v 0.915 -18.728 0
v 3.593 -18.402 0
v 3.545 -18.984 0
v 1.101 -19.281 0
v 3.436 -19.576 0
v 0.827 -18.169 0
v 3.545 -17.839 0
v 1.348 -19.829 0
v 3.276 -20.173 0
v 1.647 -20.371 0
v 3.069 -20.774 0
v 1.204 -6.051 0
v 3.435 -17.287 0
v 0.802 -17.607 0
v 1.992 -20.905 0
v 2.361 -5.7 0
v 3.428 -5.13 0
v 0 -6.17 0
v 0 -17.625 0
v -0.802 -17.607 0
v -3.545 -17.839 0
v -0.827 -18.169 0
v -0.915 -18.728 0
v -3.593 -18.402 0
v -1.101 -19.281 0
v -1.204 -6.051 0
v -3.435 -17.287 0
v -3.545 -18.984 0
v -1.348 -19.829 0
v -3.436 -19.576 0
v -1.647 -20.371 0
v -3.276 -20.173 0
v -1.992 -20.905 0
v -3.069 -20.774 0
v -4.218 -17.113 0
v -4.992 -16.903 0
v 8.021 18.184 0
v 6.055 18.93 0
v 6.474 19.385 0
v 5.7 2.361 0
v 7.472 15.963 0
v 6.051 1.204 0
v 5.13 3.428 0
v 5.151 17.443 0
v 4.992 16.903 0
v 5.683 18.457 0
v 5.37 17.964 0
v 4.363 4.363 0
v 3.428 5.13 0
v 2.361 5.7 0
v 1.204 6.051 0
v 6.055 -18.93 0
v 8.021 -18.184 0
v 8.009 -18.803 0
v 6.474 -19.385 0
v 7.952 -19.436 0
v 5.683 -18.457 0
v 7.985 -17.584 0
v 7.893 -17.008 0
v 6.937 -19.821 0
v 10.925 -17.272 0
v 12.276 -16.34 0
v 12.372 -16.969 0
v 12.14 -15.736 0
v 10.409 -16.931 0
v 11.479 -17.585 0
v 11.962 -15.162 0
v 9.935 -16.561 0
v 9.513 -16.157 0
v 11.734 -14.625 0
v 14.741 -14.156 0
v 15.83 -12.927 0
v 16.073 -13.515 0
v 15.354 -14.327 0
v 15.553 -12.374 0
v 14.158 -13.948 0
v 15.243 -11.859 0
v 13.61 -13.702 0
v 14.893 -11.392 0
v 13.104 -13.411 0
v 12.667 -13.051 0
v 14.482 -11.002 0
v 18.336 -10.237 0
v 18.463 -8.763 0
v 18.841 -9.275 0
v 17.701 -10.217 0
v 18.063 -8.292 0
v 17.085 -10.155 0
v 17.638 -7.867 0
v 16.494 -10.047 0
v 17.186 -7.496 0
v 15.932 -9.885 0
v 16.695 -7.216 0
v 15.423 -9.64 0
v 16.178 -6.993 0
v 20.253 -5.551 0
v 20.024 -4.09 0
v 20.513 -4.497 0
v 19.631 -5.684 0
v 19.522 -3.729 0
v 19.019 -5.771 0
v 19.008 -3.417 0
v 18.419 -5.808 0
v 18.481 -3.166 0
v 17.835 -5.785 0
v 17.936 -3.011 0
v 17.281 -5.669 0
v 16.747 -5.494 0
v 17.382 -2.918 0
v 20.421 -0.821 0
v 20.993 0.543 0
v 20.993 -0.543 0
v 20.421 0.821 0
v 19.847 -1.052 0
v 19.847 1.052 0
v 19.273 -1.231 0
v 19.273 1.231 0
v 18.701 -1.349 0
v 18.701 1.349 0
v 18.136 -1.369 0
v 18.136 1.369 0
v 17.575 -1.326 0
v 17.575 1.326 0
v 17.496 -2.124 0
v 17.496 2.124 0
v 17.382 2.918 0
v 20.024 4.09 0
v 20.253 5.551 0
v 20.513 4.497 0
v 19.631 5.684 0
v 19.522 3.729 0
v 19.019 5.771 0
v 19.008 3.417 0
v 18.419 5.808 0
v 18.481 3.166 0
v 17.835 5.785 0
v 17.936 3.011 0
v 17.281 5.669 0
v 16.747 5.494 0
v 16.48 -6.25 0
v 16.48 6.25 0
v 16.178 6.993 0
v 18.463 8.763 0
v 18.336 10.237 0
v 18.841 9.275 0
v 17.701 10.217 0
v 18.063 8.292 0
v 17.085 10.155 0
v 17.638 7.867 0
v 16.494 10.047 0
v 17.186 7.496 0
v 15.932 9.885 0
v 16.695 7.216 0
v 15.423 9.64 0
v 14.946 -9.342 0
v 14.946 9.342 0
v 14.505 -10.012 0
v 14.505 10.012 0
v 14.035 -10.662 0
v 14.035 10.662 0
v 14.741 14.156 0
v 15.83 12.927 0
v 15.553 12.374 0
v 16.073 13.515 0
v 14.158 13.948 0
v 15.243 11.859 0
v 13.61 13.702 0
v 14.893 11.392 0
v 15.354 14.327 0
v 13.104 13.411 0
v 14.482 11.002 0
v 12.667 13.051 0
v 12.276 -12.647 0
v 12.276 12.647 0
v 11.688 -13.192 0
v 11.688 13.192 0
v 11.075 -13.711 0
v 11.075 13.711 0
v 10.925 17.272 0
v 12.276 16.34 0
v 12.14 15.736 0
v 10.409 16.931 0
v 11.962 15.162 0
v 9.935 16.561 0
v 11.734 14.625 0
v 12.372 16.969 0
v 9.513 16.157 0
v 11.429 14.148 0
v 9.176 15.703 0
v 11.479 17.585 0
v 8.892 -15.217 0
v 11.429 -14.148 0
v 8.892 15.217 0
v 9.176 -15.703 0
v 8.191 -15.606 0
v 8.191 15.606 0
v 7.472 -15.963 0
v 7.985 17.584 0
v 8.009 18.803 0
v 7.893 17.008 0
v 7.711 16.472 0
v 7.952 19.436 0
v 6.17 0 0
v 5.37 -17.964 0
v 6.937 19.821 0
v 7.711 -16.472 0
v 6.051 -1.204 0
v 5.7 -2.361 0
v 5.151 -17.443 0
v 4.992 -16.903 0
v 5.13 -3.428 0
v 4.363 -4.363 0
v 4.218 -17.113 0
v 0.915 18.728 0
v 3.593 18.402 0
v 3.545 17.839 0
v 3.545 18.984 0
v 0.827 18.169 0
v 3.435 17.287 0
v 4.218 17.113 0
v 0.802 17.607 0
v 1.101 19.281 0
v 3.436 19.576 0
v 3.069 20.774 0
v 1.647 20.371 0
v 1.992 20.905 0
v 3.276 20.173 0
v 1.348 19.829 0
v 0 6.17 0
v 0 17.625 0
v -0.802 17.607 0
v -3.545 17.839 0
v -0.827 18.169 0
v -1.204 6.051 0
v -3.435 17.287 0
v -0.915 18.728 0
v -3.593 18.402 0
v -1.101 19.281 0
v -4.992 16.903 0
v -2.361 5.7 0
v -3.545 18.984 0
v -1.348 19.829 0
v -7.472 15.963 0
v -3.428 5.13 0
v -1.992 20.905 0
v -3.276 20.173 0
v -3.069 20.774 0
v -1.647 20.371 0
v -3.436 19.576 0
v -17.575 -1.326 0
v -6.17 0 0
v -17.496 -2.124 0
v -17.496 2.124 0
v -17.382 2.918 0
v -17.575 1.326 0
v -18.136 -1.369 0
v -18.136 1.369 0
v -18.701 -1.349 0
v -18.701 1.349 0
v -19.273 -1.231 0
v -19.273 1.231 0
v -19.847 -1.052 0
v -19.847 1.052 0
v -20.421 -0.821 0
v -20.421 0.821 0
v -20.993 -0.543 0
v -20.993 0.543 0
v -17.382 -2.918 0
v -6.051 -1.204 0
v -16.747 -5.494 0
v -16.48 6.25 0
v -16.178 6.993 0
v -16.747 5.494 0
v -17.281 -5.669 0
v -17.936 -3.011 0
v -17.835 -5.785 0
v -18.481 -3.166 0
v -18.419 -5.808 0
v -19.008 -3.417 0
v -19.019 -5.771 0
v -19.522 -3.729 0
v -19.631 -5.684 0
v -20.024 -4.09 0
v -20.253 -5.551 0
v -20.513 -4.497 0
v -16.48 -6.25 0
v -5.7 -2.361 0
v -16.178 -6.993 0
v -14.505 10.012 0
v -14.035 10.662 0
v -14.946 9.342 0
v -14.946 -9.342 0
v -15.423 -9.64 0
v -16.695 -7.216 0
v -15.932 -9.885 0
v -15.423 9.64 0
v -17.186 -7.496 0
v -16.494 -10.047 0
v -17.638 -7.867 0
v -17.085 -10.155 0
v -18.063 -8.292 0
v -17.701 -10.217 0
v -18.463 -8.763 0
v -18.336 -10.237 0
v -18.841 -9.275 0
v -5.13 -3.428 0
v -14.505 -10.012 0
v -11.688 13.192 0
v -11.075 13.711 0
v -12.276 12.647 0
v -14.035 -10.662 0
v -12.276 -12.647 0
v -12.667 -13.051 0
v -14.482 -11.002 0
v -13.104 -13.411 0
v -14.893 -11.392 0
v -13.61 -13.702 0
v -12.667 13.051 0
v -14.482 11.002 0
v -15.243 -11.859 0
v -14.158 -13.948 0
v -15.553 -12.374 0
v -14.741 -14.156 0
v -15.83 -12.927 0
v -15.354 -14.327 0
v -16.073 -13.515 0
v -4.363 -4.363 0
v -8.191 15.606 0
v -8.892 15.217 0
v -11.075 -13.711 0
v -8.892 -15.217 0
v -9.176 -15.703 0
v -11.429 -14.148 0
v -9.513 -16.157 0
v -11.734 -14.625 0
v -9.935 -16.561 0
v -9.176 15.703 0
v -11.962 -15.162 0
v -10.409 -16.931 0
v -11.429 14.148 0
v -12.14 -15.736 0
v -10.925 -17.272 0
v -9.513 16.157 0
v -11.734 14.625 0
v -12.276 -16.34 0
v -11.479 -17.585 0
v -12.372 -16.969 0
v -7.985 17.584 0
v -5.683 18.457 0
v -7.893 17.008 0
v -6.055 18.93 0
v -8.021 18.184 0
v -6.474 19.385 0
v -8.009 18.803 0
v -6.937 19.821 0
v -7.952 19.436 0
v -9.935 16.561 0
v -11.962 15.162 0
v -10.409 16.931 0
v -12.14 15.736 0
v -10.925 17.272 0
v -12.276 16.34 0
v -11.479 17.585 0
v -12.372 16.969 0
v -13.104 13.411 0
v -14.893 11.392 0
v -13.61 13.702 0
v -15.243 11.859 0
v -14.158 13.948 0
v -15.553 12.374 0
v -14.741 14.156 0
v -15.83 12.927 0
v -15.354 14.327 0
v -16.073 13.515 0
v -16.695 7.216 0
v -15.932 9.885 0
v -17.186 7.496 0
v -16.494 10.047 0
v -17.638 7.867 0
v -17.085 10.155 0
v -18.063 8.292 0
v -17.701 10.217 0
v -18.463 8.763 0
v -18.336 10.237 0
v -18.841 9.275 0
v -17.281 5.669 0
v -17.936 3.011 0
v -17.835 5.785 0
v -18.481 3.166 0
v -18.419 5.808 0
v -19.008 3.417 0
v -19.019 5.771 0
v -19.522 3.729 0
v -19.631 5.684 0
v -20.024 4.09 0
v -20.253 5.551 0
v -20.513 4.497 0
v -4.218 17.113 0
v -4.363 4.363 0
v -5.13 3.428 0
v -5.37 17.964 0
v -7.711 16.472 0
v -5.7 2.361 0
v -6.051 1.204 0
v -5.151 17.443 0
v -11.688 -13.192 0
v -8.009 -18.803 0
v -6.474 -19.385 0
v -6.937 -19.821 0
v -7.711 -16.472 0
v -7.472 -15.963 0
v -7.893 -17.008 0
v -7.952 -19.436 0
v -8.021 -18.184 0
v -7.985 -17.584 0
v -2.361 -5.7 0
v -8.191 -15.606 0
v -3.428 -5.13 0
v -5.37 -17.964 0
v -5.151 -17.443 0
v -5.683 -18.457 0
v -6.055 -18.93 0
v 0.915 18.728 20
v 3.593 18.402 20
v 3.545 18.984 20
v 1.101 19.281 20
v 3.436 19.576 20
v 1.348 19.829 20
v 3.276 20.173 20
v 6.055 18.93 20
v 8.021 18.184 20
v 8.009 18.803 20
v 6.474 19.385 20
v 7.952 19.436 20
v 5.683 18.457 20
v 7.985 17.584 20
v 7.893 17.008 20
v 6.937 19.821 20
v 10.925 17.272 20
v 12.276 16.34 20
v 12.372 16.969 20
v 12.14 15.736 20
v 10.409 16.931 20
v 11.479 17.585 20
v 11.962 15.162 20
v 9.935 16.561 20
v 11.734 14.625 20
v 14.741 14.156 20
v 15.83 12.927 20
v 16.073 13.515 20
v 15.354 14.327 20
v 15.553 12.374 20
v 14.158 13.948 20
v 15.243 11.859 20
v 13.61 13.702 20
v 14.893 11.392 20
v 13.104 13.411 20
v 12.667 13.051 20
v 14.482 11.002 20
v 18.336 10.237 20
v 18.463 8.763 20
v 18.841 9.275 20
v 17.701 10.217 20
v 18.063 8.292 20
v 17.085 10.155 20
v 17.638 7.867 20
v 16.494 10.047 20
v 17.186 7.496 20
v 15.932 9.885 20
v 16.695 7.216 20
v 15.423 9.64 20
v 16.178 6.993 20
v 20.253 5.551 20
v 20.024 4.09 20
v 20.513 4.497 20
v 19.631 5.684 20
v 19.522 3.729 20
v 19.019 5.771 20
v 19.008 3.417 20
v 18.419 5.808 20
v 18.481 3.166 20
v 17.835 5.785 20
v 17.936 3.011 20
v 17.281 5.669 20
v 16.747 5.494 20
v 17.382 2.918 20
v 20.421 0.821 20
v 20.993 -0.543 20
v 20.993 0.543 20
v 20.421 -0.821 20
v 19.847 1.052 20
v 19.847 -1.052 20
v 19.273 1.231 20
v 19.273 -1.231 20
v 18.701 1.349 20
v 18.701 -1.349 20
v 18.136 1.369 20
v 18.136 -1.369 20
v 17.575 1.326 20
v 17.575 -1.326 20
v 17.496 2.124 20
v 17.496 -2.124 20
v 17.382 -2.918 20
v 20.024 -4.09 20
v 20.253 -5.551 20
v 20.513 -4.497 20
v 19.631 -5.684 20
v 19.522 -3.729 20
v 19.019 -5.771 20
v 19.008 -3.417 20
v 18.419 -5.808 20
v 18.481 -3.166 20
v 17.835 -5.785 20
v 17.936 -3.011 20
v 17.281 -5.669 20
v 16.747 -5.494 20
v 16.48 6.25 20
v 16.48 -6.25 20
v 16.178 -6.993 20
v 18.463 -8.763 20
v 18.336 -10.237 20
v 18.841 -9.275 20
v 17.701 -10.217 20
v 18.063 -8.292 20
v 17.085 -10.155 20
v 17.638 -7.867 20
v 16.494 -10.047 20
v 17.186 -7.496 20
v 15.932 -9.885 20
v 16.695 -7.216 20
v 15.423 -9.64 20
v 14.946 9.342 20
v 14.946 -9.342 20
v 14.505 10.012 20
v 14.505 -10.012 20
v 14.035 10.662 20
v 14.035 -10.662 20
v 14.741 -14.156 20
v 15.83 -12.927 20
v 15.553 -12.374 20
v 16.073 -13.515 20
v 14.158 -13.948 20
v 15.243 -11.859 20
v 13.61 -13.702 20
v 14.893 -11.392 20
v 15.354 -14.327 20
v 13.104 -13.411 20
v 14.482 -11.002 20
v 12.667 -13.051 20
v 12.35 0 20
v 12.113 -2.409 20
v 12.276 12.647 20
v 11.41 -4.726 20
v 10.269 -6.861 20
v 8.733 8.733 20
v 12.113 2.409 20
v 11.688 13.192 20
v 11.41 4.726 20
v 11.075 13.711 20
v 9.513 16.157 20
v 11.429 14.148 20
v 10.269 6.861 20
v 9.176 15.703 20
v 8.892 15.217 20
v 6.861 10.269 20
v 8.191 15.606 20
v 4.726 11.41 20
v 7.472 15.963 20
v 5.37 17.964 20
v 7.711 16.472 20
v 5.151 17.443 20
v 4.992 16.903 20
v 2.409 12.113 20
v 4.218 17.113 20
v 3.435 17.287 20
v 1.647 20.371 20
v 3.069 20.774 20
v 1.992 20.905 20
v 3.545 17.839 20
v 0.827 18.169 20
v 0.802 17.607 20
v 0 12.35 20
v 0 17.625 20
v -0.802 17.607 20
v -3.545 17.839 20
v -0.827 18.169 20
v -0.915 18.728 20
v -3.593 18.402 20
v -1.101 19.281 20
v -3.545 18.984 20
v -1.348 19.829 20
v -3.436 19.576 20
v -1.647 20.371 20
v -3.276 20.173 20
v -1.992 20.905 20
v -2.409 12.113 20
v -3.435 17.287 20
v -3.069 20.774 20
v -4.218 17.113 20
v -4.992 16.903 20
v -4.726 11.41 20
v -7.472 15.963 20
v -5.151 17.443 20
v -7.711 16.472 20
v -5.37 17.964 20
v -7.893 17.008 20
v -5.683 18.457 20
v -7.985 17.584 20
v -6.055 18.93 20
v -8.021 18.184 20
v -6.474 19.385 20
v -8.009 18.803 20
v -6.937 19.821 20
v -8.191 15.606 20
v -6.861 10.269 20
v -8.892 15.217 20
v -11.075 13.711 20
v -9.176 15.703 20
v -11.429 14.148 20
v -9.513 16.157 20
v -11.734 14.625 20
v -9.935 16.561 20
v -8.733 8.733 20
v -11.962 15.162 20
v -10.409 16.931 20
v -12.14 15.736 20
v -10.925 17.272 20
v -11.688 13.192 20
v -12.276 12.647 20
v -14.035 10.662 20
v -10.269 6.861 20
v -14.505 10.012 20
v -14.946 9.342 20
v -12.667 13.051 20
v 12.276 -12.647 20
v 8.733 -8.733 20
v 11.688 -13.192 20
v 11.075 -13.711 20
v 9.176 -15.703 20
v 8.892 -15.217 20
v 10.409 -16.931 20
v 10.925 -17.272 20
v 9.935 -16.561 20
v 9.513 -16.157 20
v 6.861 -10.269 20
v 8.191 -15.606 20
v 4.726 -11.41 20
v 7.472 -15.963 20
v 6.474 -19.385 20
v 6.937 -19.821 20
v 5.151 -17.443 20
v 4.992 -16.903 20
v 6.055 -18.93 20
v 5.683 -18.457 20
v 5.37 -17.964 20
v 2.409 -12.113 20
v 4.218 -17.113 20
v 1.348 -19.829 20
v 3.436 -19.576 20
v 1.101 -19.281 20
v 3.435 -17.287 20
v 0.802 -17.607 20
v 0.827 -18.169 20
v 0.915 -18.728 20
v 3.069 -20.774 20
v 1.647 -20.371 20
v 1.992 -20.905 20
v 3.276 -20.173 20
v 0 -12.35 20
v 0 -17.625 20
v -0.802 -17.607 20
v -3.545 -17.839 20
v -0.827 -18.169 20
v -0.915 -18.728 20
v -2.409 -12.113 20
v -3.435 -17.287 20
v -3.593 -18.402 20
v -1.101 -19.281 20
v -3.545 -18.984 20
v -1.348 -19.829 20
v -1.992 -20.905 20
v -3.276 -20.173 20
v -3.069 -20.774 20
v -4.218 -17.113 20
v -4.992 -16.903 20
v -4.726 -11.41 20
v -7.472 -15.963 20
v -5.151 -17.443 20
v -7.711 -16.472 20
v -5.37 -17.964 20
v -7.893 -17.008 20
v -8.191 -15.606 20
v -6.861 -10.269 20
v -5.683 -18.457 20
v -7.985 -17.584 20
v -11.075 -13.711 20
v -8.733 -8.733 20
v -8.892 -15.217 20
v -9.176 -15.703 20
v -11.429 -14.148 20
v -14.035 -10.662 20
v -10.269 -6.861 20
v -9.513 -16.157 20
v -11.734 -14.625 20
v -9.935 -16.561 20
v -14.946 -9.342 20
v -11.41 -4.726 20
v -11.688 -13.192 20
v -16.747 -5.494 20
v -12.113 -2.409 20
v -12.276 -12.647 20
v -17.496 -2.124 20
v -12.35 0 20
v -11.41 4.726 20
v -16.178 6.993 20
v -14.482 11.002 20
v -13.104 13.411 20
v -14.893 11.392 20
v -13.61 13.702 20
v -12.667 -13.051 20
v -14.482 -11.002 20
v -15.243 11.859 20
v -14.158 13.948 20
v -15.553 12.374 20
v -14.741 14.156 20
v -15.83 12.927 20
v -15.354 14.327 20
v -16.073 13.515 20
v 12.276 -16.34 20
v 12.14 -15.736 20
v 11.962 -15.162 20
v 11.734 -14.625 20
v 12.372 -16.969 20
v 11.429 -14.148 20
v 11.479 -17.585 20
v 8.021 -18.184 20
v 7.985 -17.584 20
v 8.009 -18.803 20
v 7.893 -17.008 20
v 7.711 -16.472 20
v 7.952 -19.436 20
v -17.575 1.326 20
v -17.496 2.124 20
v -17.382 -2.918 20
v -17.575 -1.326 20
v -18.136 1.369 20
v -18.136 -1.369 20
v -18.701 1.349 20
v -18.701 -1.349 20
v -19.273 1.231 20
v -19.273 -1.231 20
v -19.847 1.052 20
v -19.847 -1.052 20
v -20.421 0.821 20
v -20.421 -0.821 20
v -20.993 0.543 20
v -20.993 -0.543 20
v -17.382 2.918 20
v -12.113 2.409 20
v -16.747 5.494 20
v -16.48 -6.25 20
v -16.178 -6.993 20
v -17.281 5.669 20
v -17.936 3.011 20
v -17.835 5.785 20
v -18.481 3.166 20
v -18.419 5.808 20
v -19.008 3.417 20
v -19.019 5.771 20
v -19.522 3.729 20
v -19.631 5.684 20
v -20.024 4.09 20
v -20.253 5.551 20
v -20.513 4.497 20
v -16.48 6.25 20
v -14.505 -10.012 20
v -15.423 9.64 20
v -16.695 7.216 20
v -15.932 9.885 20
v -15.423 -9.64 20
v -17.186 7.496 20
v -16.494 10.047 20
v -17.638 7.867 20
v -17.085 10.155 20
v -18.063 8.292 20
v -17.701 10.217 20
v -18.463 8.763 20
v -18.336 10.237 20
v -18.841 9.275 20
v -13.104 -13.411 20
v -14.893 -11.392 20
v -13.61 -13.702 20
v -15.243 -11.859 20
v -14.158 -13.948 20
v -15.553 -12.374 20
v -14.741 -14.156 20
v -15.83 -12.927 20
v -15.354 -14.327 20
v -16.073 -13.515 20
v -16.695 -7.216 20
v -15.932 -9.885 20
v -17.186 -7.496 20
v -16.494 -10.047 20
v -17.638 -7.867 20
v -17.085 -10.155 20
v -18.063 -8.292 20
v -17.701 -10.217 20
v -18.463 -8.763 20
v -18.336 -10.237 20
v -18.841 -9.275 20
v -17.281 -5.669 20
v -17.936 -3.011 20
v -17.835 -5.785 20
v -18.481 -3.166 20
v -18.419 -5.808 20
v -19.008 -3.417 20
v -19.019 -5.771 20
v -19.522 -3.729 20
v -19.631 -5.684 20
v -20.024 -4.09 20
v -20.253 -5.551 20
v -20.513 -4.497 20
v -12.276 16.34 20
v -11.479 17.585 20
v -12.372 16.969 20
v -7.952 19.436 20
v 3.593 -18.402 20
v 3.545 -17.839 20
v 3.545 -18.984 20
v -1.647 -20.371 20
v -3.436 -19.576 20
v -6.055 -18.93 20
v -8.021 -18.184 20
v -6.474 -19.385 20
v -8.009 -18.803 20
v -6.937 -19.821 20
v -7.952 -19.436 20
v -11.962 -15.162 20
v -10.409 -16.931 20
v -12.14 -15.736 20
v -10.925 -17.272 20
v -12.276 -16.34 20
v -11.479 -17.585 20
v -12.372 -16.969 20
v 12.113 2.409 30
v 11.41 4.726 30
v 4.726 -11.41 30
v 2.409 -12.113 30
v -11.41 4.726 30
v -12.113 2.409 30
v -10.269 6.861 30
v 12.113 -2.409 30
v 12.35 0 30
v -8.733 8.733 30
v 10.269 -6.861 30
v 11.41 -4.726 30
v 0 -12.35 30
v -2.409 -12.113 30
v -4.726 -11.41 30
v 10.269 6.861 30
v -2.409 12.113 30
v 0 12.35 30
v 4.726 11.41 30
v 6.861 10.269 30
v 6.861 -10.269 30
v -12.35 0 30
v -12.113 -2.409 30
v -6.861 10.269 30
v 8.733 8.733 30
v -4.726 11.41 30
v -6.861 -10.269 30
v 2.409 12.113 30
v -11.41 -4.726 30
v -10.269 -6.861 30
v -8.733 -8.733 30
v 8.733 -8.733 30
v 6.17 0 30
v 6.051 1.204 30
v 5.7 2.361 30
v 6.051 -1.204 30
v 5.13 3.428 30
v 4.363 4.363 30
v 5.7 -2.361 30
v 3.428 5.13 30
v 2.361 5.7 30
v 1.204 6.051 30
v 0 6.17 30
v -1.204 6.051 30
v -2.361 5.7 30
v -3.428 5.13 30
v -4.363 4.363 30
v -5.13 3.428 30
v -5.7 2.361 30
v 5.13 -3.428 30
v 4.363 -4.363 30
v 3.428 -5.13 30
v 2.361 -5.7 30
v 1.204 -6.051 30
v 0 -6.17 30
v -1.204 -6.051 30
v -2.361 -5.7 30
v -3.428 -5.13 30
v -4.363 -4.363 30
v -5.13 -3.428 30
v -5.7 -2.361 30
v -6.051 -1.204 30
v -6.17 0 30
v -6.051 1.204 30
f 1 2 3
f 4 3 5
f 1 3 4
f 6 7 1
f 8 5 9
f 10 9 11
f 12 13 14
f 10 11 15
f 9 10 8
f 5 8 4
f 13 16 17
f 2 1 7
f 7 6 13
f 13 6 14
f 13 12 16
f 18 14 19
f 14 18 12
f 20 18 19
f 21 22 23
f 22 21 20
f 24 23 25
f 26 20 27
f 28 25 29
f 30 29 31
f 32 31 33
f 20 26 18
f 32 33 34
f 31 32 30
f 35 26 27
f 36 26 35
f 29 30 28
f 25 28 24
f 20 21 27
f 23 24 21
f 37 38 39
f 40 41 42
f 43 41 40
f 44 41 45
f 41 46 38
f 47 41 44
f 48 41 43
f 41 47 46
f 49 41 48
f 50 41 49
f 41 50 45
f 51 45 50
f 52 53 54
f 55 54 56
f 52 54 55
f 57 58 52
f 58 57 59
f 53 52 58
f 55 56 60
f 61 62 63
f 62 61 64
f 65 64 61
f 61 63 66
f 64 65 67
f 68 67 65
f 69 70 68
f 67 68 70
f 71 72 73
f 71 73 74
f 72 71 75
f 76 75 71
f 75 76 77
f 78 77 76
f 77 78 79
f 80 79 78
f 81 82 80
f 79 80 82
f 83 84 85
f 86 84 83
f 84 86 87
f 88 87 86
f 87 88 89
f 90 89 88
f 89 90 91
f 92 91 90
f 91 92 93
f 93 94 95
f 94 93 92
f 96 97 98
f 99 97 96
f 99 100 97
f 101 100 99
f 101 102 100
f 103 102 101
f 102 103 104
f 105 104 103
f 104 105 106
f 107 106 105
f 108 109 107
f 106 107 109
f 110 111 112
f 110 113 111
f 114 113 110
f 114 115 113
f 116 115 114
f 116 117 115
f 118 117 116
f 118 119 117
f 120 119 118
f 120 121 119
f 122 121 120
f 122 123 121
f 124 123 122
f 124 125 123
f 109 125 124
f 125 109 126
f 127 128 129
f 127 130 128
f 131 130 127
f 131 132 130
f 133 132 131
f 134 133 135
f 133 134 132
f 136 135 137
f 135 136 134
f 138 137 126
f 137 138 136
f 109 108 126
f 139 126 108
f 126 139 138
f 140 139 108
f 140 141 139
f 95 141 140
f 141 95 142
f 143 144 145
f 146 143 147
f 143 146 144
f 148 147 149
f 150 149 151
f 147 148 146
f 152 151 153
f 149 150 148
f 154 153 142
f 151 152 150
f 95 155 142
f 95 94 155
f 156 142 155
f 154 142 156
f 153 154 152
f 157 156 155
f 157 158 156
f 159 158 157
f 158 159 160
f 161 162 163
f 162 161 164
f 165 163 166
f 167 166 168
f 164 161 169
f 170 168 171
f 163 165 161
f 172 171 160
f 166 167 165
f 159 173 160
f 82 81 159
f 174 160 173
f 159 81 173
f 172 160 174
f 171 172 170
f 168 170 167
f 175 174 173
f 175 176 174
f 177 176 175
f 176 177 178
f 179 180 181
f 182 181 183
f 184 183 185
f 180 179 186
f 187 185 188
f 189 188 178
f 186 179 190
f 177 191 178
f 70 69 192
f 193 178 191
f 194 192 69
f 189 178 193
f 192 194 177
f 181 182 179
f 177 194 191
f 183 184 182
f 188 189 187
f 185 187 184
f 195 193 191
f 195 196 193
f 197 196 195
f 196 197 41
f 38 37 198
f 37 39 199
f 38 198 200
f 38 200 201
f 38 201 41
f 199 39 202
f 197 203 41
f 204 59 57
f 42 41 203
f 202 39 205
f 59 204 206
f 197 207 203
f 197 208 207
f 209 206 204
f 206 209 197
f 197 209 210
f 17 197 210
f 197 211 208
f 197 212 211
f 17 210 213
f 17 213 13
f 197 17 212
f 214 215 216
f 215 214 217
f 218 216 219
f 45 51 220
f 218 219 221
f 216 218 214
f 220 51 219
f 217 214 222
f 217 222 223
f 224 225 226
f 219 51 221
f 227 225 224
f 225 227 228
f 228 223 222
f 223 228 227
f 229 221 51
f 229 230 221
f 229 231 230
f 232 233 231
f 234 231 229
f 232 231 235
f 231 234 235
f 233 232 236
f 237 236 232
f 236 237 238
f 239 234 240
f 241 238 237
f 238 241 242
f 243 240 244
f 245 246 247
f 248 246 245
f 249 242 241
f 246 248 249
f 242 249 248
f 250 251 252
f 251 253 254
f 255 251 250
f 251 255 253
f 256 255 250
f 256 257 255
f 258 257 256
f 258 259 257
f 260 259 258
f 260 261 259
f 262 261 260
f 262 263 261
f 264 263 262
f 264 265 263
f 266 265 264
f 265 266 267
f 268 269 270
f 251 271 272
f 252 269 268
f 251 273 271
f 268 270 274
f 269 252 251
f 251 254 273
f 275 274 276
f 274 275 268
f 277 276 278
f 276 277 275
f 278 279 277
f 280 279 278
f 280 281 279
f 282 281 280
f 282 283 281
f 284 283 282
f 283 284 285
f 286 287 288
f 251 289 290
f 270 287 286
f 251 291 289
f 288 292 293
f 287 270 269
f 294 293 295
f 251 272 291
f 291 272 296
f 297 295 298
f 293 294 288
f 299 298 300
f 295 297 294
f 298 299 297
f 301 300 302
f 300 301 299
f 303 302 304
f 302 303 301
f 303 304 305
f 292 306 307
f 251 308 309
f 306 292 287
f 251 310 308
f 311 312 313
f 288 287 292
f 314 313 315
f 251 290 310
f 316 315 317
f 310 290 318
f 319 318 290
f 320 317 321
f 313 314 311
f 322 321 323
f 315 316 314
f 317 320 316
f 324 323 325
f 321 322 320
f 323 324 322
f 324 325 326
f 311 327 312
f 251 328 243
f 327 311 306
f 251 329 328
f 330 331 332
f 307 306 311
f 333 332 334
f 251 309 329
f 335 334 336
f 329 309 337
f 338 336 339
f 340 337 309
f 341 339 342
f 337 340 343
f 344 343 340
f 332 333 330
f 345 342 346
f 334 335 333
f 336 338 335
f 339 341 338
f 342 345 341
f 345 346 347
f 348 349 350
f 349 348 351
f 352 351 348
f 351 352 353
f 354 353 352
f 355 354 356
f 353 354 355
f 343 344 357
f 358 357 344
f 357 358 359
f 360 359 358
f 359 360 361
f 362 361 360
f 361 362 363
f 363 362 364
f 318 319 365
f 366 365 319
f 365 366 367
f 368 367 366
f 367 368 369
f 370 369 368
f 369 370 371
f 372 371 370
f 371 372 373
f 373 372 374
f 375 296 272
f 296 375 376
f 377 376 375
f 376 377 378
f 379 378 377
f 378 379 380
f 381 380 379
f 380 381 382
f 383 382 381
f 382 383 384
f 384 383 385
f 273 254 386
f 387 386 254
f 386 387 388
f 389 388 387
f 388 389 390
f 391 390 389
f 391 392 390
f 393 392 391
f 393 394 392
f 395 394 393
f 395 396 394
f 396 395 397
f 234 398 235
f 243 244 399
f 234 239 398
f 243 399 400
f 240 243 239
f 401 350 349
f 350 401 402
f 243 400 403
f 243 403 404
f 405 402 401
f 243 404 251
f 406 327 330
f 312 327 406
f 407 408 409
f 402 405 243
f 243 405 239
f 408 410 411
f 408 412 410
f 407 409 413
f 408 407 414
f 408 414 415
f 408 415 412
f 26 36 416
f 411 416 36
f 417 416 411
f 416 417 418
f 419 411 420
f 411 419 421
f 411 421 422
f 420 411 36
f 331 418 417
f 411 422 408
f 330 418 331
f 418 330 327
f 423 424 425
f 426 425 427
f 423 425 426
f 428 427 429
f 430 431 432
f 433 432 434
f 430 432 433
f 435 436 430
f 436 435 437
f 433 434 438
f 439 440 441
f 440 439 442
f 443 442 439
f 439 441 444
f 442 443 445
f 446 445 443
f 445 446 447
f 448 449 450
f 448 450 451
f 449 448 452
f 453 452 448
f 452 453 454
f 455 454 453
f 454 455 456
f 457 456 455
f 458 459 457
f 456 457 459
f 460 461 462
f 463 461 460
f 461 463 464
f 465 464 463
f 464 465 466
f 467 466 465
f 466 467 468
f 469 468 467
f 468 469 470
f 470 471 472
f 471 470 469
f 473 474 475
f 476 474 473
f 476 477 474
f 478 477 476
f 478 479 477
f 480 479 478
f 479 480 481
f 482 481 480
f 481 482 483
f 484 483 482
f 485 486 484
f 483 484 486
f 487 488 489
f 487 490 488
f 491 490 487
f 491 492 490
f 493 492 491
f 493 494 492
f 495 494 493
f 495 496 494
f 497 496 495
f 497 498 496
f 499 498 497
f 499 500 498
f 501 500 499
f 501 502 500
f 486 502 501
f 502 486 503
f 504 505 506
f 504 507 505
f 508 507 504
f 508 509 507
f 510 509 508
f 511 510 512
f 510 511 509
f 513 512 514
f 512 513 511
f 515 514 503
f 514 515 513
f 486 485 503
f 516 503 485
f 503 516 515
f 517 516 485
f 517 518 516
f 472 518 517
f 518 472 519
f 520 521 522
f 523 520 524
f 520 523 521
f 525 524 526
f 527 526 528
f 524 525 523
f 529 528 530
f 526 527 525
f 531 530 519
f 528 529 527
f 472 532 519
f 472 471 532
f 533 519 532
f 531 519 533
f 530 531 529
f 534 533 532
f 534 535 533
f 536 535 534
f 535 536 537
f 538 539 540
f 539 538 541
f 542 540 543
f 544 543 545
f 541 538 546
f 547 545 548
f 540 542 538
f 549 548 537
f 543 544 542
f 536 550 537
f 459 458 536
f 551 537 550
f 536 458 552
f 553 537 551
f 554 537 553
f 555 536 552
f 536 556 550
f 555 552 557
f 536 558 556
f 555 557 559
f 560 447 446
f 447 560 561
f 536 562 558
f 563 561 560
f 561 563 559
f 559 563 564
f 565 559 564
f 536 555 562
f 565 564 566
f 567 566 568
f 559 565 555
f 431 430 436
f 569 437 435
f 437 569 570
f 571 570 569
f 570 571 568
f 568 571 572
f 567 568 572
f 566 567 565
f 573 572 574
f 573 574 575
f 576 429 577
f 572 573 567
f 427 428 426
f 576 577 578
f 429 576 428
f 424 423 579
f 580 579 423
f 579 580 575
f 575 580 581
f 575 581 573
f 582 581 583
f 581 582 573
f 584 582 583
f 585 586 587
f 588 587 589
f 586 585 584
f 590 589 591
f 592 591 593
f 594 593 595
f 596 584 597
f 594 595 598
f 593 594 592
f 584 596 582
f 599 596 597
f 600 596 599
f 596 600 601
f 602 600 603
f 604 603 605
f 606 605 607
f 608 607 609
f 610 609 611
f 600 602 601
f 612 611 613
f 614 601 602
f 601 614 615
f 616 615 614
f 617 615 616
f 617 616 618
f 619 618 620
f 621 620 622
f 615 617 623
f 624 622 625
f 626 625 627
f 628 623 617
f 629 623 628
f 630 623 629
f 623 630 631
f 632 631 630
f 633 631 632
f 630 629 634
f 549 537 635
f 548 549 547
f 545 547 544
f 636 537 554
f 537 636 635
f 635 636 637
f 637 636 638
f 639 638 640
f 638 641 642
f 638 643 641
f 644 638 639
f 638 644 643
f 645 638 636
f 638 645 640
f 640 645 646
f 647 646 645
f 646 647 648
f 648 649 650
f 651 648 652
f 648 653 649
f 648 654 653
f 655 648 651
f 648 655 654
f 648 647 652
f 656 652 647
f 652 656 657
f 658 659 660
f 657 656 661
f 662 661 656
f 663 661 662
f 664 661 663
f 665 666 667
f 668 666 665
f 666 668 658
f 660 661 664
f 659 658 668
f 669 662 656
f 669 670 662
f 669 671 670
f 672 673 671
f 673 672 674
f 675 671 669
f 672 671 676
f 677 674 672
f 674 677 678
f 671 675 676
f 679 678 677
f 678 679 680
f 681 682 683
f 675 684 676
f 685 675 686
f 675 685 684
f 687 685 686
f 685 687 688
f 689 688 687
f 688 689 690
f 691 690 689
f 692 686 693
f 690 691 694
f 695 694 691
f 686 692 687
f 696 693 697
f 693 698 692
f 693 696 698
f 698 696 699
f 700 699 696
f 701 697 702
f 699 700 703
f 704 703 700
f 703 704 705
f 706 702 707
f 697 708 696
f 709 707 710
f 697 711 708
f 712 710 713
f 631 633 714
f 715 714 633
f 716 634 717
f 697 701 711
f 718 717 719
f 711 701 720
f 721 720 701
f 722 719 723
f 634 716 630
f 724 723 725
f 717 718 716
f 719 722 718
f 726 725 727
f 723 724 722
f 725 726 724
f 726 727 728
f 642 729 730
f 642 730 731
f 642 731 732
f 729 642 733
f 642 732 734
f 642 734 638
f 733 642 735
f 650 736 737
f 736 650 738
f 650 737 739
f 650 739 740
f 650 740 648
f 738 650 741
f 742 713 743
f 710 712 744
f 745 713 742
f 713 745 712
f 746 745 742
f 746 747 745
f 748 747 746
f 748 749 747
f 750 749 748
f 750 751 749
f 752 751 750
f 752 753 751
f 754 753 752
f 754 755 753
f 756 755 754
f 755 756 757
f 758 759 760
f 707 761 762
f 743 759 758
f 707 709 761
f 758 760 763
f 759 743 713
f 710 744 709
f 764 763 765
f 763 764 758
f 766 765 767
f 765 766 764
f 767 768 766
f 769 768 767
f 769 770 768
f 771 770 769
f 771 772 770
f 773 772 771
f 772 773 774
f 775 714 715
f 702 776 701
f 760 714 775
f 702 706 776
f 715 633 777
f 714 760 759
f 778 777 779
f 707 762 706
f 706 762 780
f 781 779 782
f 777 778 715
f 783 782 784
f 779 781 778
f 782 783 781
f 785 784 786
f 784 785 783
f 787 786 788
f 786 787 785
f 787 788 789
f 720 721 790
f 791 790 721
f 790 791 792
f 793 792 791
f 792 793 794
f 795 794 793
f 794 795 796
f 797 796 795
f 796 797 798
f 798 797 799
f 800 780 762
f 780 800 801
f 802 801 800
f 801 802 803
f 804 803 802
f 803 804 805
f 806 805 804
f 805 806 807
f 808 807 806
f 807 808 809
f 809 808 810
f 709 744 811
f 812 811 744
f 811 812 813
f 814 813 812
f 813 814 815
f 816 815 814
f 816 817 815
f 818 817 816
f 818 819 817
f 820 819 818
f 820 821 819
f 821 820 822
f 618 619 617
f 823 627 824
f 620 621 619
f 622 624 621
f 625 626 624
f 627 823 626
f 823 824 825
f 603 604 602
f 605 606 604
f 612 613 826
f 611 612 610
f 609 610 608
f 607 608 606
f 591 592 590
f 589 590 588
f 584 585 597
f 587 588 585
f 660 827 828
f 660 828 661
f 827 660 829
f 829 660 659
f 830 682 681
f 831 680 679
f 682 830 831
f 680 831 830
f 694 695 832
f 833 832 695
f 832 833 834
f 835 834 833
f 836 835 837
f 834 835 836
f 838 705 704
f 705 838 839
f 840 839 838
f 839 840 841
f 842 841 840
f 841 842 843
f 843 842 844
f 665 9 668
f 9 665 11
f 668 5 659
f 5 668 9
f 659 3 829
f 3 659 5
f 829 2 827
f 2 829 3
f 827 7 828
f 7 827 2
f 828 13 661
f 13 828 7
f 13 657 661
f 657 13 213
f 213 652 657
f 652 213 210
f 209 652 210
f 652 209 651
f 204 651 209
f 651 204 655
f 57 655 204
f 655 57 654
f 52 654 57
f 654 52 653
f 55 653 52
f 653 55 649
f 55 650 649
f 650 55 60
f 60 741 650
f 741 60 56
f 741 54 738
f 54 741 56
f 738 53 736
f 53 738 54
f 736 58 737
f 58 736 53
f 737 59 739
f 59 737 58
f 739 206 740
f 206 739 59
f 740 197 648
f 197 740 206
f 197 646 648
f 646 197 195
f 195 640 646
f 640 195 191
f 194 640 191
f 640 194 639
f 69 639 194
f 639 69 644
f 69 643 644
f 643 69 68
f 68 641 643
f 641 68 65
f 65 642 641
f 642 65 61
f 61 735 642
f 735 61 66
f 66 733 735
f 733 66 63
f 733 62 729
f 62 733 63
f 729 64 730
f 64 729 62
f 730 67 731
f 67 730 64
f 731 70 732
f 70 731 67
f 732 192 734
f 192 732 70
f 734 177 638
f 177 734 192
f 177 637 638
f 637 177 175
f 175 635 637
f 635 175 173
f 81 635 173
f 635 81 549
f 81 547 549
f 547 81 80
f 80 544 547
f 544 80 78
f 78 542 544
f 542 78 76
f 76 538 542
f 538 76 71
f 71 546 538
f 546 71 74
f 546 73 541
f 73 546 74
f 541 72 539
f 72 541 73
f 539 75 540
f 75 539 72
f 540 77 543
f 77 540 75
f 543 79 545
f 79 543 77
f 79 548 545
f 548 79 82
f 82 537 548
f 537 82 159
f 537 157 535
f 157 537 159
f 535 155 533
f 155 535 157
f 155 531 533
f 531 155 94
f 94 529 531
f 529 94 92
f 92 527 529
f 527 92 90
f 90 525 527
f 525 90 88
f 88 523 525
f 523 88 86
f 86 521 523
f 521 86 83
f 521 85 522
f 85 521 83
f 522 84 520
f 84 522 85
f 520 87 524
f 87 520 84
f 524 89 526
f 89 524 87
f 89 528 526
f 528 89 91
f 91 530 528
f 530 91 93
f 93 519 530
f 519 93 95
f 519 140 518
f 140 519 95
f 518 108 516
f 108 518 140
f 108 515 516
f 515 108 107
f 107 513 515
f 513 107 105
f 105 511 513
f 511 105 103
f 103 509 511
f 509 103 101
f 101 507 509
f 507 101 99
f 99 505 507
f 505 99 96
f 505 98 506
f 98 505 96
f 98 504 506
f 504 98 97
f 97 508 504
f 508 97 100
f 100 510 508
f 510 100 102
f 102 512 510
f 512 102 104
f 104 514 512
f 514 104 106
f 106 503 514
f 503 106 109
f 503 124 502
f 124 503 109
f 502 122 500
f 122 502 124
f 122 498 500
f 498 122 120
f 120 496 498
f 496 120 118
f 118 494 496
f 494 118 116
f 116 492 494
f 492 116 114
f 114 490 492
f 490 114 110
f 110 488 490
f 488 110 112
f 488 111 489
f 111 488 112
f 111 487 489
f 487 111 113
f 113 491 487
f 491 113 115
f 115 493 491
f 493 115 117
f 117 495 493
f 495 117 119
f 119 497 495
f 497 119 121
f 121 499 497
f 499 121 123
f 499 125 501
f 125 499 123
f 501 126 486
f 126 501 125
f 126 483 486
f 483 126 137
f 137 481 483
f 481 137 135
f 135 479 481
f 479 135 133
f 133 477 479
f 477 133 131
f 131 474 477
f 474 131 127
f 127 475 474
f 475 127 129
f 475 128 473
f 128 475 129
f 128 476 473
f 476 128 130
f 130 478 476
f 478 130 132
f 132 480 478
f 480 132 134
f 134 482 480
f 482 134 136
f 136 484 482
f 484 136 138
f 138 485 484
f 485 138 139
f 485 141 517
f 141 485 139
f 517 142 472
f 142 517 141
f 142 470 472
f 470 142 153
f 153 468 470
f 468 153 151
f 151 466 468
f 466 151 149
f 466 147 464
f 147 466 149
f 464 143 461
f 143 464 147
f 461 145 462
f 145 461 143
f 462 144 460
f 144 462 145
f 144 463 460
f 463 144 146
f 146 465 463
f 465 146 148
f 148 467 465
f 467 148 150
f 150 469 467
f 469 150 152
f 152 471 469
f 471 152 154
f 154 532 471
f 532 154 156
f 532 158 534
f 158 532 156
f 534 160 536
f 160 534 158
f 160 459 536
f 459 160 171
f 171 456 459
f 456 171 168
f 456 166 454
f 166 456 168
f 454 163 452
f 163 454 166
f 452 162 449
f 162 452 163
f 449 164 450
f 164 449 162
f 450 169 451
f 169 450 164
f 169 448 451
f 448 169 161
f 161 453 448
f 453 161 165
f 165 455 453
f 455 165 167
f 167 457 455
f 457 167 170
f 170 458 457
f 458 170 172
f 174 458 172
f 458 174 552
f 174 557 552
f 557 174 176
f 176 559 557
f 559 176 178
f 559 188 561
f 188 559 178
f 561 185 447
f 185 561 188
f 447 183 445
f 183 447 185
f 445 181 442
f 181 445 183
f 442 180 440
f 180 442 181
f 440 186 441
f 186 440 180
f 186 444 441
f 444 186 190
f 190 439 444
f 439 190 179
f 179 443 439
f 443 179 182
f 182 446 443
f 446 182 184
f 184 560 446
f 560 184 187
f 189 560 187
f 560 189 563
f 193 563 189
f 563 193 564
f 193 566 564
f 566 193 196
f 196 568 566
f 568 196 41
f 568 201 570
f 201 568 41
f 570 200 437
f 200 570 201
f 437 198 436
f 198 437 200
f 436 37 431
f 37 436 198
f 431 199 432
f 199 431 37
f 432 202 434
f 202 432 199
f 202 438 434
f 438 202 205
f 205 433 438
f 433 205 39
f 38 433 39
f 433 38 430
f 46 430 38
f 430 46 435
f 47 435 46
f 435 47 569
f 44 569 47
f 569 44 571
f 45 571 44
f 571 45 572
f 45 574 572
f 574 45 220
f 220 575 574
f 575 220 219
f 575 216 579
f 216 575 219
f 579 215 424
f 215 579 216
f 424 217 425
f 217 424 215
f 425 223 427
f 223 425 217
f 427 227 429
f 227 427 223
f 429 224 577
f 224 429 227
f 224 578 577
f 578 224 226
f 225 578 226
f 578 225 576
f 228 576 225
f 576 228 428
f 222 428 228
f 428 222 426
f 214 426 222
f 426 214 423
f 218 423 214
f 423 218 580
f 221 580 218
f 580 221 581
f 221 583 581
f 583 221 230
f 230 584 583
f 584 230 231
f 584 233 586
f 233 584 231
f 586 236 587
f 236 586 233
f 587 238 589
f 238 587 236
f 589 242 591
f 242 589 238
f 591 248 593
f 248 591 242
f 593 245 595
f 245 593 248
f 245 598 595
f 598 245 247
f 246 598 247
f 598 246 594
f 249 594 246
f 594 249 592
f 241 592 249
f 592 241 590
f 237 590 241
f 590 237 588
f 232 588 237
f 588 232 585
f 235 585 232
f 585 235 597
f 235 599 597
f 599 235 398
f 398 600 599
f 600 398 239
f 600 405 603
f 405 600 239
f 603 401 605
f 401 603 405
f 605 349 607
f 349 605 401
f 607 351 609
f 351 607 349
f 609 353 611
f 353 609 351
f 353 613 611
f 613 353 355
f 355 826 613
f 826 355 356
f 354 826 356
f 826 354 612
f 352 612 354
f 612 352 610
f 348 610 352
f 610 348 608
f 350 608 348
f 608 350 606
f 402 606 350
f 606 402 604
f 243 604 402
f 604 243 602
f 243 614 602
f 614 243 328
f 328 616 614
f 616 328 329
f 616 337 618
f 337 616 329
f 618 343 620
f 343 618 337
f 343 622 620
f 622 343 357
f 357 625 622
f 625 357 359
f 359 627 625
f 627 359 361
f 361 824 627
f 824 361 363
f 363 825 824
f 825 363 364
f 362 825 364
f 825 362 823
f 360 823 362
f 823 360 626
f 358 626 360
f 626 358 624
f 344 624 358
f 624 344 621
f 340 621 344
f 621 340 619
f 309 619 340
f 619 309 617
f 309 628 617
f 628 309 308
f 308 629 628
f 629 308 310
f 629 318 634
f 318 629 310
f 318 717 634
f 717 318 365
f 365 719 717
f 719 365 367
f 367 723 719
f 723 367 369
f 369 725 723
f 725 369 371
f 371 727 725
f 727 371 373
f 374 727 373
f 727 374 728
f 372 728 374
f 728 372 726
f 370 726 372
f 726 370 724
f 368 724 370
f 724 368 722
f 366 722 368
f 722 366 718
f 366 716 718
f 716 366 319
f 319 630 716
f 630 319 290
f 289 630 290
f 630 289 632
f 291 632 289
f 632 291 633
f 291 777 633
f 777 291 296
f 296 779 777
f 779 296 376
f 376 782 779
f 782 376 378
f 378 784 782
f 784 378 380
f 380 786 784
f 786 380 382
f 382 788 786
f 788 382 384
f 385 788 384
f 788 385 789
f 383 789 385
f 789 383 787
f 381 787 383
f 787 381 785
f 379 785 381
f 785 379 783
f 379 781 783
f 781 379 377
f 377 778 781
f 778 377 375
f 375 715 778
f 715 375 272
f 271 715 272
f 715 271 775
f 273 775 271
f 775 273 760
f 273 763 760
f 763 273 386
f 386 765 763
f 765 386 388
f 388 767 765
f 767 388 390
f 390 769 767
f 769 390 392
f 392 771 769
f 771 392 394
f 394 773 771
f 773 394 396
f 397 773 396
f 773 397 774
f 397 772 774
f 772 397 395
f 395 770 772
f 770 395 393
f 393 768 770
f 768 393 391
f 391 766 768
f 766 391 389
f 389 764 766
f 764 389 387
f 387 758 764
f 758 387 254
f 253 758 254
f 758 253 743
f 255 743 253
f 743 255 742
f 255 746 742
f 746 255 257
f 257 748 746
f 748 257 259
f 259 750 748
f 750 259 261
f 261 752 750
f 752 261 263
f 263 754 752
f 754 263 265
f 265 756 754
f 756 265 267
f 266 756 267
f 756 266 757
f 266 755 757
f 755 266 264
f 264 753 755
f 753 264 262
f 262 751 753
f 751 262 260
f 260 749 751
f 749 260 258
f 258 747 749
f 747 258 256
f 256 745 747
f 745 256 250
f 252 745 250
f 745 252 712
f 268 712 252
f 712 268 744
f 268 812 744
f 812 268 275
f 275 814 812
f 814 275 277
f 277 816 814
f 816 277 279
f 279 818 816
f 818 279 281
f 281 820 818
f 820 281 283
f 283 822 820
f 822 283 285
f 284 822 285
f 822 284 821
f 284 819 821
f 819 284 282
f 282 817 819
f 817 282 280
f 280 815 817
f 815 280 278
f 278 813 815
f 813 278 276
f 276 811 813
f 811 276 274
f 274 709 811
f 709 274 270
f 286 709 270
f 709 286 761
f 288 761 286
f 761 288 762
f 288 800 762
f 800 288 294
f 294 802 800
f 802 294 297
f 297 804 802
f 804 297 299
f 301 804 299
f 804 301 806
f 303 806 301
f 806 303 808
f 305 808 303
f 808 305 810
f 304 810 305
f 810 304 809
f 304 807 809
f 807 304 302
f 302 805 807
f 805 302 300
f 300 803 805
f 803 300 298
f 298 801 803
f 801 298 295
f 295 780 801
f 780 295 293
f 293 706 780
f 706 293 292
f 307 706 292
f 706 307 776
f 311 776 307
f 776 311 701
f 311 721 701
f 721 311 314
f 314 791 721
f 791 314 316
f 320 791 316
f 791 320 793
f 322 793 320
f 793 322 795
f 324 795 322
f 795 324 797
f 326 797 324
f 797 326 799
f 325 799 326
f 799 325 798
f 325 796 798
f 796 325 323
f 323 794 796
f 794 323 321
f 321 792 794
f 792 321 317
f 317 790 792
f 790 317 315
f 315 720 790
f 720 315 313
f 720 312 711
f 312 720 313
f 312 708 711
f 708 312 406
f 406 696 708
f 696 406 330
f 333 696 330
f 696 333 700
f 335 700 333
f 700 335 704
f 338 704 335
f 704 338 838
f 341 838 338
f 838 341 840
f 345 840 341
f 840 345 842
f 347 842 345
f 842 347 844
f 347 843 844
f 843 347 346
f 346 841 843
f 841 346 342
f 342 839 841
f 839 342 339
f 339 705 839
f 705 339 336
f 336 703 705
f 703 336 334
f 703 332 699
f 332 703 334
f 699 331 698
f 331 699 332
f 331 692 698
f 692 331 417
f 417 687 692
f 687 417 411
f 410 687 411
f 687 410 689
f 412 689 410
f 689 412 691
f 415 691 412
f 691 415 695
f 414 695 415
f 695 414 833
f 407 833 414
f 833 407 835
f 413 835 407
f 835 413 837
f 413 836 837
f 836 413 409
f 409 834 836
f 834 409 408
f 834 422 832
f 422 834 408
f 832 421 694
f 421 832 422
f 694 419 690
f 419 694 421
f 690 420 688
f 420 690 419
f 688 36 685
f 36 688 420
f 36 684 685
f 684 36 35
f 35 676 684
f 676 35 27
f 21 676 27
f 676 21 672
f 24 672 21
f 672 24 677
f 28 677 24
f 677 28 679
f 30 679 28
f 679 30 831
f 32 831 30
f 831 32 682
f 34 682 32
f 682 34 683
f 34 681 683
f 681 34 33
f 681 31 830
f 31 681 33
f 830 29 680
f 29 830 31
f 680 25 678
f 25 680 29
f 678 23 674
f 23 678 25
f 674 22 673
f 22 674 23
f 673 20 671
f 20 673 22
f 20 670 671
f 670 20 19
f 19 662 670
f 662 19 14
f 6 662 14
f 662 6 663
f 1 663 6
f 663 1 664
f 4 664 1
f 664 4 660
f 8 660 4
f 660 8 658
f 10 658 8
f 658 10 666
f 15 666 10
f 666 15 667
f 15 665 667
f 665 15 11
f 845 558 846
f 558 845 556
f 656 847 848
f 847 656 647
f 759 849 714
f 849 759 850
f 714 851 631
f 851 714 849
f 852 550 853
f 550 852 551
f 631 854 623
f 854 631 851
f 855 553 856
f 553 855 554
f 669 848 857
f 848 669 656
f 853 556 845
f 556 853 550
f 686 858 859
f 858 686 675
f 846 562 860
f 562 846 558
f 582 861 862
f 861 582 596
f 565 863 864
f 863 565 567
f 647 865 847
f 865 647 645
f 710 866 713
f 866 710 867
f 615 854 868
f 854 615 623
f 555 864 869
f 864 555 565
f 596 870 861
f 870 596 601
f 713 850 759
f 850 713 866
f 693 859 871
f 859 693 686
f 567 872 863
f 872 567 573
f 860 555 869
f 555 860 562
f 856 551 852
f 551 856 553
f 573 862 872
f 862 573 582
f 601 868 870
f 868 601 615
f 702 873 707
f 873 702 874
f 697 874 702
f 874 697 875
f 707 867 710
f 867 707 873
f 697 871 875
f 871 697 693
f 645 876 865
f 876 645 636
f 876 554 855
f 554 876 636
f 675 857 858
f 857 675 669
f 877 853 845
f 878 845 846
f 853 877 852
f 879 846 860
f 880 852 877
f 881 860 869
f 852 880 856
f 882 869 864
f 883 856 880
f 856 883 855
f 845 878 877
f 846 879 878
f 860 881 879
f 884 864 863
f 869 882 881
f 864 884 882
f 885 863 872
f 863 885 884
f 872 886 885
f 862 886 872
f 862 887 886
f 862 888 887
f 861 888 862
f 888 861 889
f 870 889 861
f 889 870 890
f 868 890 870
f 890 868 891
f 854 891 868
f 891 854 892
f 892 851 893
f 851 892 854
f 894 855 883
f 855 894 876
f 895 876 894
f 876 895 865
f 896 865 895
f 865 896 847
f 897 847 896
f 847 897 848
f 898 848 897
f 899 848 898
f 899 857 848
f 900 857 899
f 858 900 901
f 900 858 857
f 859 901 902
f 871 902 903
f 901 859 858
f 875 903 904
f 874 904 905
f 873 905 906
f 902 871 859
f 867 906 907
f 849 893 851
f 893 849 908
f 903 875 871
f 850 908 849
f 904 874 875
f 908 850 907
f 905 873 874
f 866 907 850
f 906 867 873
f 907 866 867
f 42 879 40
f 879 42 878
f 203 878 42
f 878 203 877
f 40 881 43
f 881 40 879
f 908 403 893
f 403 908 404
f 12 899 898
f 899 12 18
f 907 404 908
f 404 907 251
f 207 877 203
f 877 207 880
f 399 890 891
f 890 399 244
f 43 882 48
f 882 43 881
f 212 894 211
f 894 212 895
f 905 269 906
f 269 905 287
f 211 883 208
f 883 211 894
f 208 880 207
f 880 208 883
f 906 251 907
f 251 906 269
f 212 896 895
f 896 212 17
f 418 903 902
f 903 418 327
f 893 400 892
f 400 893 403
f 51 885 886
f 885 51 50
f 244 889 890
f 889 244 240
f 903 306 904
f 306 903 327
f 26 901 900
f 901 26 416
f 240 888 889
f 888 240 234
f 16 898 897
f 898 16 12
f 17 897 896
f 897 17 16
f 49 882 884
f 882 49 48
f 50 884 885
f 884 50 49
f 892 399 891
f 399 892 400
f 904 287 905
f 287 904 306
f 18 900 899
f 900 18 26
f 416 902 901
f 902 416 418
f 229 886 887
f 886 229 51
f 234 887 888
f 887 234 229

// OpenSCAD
$fn = 32;

// ----------------------------------------------------------------------
// Spur gear: m=1.5 z=26, 42 mm tip diameter x 30 mm
// ----------------------------------------------------------------------

// --- parameters (mm) ---
module_m = 1.5;           // module
teeth = 26;               // number of teeth
face_w = 20;              // face width
pa = 20;                  // pressure angle, deg
bore_d = 12.34;           // shaft bore
hub_d = 24.7;             // hub diameter
hub_h = 10;               // hub above the face

/* --- involute profile --- */
pitch_r = module_m * teeth / 2;
base_r = pitch_r * cos(pa);
tip_r = pitch_r + module_m;
root_r = pitch_r - 1.25 * module_m;
flank_steps = 6;

function inv_deg(a) = (tan(a) - a * PI / 180) * 180 / PI;
function flank_r(i) = root_r + (tip_r - root_r) * i / flank_steps;
function half_angle(r) = 90 / teeth + inv_deg(pa) - inv_deg(acos(min(1, base_r / r)));
function tooth_pt(k, i, side) =
    let (r = flank_r(i), a = k * 360 / teeth + side * half_angle(r))
    [r * cos(a), r * sin(a)];

module tooth_profile() {
  polygon(points = [
    for (k = [0 : teeth - 1])
      each [
        for (i = [0 : flank_steps]) tooth_pt(k, i, -1),
        for (i = [flank_steps : -1 : 0]) tooth_pt(k, i, 1),
        let (ta = (k + 0.5) * 360 / teeth)
          [root_r * cos(ta), root_r * sin(ta)]
      ]
  ]);
}

module gear_disc() {
  linear_extrude(height = face_w) tooth_profile();
}

module hub_boss() {
  translate([0, 0, face_w - 1]) cylinder(h = hub_h + 1, d = hub_d);
}

difference() {
  union() {
    gear_disc();
    hub_boss();
  }
  translate([0, 0, -1]) cylinder(h = face_w + hub_h + 3, d = bore_d);
}
